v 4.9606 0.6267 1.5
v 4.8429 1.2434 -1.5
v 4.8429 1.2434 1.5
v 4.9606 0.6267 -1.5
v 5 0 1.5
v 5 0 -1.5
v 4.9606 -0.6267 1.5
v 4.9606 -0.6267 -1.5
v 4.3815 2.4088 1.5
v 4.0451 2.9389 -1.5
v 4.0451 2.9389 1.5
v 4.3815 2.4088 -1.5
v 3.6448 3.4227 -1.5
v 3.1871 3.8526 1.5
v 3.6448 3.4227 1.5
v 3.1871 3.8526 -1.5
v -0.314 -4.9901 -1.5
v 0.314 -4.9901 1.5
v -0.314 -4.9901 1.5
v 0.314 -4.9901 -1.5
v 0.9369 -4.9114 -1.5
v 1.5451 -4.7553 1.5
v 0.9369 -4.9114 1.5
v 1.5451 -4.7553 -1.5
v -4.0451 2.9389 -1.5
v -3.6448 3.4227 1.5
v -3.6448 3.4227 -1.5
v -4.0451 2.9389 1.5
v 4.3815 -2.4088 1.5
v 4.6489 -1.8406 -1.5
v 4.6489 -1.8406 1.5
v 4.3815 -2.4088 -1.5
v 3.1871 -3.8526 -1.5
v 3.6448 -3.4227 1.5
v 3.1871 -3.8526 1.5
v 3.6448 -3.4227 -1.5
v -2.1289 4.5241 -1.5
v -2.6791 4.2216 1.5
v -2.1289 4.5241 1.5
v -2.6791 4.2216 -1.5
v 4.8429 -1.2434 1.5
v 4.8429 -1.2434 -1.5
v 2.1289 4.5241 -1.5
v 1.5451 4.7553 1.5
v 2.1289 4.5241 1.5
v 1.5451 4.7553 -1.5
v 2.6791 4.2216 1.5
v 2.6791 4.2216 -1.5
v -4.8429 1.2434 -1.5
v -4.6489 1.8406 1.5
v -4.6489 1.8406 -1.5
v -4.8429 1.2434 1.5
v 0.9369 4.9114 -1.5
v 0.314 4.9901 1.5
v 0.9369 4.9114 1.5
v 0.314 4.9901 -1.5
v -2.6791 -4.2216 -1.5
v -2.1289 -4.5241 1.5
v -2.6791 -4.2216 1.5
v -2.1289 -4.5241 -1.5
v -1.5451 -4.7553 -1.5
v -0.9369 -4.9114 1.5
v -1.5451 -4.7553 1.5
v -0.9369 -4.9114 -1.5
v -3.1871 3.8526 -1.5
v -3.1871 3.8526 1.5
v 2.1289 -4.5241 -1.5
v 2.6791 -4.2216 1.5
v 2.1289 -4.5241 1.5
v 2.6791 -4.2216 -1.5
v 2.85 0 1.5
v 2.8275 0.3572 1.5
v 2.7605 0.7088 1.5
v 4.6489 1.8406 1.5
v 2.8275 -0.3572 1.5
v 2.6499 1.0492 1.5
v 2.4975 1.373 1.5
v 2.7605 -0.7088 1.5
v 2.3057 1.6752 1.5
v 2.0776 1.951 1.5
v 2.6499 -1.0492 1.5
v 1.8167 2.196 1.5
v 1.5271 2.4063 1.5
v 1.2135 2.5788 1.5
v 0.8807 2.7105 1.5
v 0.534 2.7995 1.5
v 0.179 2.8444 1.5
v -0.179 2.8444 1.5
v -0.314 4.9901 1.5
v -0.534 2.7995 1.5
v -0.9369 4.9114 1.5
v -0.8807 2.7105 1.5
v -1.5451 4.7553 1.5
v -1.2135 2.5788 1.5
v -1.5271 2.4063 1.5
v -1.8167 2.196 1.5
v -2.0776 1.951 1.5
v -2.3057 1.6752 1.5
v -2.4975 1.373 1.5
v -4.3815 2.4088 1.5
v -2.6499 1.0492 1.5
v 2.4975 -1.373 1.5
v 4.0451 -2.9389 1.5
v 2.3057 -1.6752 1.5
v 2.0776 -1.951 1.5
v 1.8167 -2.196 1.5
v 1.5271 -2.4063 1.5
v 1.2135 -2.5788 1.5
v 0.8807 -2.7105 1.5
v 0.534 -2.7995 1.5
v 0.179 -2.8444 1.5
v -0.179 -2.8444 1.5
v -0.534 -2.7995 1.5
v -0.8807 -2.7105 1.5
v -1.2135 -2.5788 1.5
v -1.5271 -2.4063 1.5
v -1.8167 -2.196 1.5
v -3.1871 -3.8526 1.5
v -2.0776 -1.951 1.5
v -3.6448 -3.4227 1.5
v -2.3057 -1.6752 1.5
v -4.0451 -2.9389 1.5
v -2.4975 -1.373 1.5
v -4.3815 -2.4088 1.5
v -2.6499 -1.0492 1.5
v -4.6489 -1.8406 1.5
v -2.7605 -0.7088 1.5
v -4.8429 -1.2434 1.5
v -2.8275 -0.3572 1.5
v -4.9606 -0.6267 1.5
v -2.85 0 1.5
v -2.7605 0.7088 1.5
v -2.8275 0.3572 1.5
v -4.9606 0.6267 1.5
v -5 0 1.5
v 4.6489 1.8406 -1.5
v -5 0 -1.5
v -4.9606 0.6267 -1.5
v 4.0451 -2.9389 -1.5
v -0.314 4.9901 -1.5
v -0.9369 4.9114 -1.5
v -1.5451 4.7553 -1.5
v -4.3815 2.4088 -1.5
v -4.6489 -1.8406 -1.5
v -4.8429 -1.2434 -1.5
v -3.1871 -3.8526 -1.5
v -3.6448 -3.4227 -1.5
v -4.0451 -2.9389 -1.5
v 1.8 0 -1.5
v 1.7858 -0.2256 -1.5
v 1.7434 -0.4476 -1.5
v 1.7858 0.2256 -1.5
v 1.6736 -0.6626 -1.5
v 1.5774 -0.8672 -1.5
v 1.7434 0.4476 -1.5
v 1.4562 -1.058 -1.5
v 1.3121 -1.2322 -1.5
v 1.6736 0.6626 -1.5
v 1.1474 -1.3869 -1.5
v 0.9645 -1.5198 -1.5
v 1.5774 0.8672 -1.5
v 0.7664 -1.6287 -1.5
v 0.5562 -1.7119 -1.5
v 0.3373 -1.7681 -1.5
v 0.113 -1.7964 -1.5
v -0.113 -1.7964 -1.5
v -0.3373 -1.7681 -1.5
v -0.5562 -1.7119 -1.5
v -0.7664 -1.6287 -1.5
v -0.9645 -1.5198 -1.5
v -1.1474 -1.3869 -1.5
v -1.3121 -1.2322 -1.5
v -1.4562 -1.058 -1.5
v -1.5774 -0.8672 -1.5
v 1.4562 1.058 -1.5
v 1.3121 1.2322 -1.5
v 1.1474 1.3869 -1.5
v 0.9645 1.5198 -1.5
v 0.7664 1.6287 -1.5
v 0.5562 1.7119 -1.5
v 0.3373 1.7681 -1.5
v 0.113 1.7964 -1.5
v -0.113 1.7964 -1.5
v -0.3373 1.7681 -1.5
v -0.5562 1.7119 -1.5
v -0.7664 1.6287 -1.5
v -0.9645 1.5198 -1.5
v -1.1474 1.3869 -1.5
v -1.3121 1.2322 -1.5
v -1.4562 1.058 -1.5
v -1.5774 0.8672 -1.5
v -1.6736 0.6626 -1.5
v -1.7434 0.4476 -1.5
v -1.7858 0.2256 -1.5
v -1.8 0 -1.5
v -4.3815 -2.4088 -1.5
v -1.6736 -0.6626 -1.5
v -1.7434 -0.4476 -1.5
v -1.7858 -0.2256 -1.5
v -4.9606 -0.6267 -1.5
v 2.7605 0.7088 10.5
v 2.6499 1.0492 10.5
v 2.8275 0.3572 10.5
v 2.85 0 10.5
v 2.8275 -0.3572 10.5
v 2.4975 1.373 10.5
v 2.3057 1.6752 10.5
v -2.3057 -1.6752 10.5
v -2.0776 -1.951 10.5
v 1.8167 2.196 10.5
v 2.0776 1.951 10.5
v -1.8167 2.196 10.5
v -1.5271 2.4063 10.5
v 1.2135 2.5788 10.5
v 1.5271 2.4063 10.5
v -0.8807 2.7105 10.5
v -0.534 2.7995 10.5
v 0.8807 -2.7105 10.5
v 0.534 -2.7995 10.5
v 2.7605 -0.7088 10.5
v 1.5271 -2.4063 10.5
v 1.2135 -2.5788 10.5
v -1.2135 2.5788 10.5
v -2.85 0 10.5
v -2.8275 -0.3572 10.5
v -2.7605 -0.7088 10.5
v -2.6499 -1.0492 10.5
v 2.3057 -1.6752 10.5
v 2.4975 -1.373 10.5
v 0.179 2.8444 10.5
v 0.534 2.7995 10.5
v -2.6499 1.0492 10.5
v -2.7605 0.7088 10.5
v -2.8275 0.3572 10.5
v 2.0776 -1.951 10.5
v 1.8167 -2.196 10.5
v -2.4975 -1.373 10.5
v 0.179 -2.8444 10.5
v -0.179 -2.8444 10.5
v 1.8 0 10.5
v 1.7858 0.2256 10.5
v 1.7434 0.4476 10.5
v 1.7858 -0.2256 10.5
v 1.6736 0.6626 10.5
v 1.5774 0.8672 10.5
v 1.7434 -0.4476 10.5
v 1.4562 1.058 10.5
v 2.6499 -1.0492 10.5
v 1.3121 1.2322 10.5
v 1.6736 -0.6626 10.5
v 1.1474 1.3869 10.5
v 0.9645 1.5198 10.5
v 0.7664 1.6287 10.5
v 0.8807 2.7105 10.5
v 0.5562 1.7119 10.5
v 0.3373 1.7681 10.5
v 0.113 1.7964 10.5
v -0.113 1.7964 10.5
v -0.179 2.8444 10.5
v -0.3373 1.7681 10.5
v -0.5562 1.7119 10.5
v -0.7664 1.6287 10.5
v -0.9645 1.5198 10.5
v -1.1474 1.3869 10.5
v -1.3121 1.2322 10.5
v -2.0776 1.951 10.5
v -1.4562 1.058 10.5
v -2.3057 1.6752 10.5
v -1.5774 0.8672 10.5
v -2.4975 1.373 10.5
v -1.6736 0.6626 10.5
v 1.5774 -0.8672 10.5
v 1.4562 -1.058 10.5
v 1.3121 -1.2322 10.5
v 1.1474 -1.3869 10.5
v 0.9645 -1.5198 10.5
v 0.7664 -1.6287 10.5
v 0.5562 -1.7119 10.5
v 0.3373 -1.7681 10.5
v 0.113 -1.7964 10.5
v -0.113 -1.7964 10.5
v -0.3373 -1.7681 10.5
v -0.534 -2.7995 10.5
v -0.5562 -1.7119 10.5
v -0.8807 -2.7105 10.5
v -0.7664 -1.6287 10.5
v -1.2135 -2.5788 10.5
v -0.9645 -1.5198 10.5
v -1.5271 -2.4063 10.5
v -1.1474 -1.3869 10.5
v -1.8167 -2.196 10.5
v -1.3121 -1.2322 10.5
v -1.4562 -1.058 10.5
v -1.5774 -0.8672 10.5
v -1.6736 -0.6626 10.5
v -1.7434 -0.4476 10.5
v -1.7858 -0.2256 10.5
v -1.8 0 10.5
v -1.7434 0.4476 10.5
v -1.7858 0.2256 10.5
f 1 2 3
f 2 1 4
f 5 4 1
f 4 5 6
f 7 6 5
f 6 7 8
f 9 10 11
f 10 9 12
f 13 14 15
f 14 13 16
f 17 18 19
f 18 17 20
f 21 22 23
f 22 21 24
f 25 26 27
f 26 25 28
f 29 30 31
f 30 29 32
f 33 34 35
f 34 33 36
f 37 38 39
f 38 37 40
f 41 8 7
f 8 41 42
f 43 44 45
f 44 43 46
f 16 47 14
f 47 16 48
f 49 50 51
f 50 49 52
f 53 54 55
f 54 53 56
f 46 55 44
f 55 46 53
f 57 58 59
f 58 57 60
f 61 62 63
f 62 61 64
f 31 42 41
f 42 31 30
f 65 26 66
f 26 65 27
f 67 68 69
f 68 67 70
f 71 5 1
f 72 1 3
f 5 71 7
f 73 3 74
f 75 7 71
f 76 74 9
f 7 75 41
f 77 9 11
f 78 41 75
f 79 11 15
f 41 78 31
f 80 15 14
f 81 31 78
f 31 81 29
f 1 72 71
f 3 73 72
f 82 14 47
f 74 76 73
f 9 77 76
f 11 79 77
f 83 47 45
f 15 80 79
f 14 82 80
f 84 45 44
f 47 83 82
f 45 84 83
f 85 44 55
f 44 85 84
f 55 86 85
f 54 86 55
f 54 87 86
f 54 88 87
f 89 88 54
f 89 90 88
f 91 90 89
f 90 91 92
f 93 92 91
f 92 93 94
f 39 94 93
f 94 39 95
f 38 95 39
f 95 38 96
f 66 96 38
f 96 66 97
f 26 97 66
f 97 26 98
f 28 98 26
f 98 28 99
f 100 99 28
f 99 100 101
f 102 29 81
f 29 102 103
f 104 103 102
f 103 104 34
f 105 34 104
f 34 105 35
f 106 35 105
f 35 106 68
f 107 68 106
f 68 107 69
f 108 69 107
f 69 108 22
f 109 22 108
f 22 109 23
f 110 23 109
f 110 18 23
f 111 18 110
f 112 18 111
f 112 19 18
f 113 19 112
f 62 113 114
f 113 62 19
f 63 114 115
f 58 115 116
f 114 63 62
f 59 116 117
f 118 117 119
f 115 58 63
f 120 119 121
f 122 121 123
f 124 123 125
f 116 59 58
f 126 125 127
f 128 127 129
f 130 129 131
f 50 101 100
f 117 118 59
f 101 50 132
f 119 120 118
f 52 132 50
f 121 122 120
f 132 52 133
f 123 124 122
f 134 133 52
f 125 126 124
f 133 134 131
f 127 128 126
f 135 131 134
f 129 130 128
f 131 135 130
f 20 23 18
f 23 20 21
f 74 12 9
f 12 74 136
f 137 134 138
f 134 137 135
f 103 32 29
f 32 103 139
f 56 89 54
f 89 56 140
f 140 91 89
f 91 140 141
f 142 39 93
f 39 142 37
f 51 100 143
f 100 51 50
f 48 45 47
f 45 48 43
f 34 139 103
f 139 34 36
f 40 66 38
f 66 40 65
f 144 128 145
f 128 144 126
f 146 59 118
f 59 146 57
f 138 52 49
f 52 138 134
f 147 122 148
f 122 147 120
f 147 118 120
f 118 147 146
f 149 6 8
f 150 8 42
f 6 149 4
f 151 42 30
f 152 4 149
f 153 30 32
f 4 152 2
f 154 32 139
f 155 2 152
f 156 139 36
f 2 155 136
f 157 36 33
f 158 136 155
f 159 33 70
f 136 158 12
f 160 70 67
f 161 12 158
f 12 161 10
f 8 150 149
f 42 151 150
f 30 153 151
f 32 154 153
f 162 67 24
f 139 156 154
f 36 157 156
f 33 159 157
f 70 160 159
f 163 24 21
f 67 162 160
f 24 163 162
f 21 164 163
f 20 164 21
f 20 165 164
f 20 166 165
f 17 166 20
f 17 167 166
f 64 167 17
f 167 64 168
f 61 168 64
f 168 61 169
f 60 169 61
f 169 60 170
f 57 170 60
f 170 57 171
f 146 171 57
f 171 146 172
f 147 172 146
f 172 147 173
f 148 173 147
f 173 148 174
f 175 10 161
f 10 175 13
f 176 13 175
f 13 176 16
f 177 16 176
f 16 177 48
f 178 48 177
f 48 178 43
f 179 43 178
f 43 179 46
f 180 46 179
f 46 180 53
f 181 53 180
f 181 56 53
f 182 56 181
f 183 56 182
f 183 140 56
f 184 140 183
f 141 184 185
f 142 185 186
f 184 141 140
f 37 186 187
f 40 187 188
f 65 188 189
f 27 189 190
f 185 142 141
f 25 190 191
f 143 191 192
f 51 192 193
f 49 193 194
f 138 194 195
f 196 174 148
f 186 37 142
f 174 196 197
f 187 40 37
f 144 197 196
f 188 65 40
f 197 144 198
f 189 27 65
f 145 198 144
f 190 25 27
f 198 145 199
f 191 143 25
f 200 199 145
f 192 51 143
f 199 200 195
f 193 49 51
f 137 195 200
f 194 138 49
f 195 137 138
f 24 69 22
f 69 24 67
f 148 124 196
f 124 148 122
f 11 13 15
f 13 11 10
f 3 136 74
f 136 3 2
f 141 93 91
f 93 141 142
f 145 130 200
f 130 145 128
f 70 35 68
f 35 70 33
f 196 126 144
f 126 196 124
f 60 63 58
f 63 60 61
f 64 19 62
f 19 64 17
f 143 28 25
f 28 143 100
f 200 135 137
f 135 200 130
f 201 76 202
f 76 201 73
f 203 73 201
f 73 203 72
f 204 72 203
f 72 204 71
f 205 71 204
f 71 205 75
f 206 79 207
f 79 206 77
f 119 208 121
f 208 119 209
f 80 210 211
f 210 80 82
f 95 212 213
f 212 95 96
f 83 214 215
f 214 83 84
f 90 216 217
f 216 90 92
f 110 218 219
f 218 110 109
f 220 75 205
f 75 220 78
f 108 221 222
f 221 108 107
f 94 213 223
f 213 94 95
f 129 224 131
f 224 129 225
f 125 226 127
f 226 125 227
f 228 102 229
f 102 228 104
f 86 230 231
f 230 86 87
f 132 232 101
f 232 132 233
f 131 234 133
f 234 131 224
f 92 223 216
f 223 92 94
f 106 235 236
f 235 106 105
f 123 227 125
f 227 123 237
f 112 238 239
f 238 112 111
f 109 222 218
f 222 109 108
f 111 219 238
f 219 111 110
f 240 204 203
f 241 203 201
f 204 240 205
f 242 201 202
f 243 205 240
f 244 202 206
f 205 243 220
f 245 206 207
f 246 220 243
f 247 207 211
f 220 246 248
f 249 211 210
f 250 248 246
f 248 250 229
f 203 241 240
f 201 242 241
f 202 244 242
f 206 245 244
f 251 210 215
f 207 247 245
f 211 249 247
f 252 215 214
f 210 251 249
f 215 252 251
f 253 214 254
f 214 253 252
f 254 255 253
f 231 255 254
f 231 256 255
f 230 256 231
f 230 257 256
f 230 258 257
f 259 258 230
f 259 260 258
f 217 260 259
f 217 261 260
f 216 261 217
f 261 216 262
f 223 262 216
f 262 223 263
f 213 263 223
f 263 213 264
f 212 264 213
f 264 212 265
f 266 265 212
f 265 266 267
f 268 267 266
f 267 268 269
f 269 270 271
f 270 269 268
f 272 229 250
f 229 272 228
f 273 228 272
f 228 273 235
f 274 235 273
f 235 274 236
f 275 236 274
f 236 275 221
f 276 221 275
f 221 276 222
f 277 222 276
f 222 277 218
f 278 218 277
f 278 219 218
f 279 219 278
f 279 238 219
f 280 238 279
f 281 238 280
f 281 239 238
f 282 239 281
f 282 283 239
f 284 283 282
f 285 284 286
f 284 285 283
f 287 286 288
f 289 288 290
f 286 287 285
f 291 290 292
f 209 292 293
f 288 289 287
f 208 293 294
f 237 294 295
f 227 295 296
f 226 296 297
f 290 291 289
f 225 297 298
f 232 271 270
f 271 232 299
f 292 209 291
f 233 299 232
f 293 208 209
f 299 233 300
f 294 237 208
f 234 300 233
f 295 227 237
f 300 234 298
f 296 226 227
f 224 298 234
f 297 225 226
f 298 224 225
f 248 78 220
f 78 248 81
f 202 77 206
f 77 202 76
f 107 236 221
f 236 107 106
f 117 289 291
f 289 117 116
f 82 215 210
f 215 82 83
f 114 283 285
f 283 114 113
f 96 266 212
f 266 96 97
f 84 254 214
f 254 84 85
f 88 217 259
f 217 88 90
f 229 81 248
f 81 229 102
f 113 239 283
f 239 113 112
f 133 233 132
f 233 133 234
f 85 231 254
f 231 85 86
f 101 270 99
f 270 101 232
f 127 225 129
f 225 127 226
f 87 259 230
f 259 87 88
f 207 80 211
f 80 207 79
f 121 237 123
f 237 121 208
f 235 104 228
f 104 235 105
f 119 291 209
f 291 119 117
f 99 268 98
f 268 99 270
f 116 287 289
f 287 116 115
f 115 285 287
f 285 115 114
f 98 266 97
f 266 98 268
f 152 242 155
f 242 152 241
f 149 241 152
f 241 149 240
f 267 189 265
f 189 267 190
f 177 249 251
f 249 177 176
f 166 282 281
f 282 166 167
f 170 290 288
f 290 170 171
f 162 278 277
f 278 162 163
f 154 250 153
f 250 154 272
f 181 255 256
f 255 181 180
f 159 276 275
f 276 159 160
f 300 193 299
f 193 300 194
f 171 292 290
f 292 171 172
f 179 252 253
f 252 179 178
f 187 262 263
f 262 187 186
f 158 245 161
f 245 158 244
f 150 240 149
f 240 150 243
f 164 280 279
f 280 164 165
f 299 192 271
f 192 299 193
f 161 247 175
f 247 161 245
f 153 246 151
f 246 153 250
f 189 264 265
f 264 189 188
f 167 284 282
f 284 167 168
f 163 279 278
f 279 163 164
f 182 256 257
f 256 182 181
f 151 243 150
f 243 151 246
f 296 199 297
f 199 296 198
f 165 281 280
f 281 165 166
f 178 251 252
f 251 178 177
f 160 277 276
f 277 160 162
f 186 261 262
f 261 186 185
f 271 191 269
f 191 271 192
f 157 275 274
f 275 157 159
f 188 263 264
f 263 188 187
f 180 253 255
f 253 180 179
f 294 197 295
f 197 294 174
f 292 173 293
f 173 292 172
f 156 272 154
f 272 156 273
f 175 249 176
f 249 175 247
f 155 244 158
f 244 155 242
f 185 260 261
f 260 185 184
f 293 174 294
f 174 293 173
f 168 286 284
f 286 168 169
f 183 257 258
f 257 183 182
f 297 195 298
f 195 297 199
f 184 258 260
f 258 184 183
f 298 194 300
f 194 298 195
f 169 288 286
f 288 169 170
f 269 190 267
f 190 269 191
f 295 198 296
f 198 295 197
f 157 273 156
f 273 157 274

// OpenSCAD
$fn = 50;


difference() {
	union() {
		translate(v = [0, 0, -1.5000000000]) {
			cylinder(h = 3, r = 5.0000000000);
		}
		translate(v = [0, 0, -1.5000000000]) {
			cylinder(h = 12, r = 2.8500000000);
		}
	}
	union() {
		translate(v = [0, 0, -100.0000000000]) {
			cylinder(h = 200, r = 1.8000000000);
		}
	}
}
